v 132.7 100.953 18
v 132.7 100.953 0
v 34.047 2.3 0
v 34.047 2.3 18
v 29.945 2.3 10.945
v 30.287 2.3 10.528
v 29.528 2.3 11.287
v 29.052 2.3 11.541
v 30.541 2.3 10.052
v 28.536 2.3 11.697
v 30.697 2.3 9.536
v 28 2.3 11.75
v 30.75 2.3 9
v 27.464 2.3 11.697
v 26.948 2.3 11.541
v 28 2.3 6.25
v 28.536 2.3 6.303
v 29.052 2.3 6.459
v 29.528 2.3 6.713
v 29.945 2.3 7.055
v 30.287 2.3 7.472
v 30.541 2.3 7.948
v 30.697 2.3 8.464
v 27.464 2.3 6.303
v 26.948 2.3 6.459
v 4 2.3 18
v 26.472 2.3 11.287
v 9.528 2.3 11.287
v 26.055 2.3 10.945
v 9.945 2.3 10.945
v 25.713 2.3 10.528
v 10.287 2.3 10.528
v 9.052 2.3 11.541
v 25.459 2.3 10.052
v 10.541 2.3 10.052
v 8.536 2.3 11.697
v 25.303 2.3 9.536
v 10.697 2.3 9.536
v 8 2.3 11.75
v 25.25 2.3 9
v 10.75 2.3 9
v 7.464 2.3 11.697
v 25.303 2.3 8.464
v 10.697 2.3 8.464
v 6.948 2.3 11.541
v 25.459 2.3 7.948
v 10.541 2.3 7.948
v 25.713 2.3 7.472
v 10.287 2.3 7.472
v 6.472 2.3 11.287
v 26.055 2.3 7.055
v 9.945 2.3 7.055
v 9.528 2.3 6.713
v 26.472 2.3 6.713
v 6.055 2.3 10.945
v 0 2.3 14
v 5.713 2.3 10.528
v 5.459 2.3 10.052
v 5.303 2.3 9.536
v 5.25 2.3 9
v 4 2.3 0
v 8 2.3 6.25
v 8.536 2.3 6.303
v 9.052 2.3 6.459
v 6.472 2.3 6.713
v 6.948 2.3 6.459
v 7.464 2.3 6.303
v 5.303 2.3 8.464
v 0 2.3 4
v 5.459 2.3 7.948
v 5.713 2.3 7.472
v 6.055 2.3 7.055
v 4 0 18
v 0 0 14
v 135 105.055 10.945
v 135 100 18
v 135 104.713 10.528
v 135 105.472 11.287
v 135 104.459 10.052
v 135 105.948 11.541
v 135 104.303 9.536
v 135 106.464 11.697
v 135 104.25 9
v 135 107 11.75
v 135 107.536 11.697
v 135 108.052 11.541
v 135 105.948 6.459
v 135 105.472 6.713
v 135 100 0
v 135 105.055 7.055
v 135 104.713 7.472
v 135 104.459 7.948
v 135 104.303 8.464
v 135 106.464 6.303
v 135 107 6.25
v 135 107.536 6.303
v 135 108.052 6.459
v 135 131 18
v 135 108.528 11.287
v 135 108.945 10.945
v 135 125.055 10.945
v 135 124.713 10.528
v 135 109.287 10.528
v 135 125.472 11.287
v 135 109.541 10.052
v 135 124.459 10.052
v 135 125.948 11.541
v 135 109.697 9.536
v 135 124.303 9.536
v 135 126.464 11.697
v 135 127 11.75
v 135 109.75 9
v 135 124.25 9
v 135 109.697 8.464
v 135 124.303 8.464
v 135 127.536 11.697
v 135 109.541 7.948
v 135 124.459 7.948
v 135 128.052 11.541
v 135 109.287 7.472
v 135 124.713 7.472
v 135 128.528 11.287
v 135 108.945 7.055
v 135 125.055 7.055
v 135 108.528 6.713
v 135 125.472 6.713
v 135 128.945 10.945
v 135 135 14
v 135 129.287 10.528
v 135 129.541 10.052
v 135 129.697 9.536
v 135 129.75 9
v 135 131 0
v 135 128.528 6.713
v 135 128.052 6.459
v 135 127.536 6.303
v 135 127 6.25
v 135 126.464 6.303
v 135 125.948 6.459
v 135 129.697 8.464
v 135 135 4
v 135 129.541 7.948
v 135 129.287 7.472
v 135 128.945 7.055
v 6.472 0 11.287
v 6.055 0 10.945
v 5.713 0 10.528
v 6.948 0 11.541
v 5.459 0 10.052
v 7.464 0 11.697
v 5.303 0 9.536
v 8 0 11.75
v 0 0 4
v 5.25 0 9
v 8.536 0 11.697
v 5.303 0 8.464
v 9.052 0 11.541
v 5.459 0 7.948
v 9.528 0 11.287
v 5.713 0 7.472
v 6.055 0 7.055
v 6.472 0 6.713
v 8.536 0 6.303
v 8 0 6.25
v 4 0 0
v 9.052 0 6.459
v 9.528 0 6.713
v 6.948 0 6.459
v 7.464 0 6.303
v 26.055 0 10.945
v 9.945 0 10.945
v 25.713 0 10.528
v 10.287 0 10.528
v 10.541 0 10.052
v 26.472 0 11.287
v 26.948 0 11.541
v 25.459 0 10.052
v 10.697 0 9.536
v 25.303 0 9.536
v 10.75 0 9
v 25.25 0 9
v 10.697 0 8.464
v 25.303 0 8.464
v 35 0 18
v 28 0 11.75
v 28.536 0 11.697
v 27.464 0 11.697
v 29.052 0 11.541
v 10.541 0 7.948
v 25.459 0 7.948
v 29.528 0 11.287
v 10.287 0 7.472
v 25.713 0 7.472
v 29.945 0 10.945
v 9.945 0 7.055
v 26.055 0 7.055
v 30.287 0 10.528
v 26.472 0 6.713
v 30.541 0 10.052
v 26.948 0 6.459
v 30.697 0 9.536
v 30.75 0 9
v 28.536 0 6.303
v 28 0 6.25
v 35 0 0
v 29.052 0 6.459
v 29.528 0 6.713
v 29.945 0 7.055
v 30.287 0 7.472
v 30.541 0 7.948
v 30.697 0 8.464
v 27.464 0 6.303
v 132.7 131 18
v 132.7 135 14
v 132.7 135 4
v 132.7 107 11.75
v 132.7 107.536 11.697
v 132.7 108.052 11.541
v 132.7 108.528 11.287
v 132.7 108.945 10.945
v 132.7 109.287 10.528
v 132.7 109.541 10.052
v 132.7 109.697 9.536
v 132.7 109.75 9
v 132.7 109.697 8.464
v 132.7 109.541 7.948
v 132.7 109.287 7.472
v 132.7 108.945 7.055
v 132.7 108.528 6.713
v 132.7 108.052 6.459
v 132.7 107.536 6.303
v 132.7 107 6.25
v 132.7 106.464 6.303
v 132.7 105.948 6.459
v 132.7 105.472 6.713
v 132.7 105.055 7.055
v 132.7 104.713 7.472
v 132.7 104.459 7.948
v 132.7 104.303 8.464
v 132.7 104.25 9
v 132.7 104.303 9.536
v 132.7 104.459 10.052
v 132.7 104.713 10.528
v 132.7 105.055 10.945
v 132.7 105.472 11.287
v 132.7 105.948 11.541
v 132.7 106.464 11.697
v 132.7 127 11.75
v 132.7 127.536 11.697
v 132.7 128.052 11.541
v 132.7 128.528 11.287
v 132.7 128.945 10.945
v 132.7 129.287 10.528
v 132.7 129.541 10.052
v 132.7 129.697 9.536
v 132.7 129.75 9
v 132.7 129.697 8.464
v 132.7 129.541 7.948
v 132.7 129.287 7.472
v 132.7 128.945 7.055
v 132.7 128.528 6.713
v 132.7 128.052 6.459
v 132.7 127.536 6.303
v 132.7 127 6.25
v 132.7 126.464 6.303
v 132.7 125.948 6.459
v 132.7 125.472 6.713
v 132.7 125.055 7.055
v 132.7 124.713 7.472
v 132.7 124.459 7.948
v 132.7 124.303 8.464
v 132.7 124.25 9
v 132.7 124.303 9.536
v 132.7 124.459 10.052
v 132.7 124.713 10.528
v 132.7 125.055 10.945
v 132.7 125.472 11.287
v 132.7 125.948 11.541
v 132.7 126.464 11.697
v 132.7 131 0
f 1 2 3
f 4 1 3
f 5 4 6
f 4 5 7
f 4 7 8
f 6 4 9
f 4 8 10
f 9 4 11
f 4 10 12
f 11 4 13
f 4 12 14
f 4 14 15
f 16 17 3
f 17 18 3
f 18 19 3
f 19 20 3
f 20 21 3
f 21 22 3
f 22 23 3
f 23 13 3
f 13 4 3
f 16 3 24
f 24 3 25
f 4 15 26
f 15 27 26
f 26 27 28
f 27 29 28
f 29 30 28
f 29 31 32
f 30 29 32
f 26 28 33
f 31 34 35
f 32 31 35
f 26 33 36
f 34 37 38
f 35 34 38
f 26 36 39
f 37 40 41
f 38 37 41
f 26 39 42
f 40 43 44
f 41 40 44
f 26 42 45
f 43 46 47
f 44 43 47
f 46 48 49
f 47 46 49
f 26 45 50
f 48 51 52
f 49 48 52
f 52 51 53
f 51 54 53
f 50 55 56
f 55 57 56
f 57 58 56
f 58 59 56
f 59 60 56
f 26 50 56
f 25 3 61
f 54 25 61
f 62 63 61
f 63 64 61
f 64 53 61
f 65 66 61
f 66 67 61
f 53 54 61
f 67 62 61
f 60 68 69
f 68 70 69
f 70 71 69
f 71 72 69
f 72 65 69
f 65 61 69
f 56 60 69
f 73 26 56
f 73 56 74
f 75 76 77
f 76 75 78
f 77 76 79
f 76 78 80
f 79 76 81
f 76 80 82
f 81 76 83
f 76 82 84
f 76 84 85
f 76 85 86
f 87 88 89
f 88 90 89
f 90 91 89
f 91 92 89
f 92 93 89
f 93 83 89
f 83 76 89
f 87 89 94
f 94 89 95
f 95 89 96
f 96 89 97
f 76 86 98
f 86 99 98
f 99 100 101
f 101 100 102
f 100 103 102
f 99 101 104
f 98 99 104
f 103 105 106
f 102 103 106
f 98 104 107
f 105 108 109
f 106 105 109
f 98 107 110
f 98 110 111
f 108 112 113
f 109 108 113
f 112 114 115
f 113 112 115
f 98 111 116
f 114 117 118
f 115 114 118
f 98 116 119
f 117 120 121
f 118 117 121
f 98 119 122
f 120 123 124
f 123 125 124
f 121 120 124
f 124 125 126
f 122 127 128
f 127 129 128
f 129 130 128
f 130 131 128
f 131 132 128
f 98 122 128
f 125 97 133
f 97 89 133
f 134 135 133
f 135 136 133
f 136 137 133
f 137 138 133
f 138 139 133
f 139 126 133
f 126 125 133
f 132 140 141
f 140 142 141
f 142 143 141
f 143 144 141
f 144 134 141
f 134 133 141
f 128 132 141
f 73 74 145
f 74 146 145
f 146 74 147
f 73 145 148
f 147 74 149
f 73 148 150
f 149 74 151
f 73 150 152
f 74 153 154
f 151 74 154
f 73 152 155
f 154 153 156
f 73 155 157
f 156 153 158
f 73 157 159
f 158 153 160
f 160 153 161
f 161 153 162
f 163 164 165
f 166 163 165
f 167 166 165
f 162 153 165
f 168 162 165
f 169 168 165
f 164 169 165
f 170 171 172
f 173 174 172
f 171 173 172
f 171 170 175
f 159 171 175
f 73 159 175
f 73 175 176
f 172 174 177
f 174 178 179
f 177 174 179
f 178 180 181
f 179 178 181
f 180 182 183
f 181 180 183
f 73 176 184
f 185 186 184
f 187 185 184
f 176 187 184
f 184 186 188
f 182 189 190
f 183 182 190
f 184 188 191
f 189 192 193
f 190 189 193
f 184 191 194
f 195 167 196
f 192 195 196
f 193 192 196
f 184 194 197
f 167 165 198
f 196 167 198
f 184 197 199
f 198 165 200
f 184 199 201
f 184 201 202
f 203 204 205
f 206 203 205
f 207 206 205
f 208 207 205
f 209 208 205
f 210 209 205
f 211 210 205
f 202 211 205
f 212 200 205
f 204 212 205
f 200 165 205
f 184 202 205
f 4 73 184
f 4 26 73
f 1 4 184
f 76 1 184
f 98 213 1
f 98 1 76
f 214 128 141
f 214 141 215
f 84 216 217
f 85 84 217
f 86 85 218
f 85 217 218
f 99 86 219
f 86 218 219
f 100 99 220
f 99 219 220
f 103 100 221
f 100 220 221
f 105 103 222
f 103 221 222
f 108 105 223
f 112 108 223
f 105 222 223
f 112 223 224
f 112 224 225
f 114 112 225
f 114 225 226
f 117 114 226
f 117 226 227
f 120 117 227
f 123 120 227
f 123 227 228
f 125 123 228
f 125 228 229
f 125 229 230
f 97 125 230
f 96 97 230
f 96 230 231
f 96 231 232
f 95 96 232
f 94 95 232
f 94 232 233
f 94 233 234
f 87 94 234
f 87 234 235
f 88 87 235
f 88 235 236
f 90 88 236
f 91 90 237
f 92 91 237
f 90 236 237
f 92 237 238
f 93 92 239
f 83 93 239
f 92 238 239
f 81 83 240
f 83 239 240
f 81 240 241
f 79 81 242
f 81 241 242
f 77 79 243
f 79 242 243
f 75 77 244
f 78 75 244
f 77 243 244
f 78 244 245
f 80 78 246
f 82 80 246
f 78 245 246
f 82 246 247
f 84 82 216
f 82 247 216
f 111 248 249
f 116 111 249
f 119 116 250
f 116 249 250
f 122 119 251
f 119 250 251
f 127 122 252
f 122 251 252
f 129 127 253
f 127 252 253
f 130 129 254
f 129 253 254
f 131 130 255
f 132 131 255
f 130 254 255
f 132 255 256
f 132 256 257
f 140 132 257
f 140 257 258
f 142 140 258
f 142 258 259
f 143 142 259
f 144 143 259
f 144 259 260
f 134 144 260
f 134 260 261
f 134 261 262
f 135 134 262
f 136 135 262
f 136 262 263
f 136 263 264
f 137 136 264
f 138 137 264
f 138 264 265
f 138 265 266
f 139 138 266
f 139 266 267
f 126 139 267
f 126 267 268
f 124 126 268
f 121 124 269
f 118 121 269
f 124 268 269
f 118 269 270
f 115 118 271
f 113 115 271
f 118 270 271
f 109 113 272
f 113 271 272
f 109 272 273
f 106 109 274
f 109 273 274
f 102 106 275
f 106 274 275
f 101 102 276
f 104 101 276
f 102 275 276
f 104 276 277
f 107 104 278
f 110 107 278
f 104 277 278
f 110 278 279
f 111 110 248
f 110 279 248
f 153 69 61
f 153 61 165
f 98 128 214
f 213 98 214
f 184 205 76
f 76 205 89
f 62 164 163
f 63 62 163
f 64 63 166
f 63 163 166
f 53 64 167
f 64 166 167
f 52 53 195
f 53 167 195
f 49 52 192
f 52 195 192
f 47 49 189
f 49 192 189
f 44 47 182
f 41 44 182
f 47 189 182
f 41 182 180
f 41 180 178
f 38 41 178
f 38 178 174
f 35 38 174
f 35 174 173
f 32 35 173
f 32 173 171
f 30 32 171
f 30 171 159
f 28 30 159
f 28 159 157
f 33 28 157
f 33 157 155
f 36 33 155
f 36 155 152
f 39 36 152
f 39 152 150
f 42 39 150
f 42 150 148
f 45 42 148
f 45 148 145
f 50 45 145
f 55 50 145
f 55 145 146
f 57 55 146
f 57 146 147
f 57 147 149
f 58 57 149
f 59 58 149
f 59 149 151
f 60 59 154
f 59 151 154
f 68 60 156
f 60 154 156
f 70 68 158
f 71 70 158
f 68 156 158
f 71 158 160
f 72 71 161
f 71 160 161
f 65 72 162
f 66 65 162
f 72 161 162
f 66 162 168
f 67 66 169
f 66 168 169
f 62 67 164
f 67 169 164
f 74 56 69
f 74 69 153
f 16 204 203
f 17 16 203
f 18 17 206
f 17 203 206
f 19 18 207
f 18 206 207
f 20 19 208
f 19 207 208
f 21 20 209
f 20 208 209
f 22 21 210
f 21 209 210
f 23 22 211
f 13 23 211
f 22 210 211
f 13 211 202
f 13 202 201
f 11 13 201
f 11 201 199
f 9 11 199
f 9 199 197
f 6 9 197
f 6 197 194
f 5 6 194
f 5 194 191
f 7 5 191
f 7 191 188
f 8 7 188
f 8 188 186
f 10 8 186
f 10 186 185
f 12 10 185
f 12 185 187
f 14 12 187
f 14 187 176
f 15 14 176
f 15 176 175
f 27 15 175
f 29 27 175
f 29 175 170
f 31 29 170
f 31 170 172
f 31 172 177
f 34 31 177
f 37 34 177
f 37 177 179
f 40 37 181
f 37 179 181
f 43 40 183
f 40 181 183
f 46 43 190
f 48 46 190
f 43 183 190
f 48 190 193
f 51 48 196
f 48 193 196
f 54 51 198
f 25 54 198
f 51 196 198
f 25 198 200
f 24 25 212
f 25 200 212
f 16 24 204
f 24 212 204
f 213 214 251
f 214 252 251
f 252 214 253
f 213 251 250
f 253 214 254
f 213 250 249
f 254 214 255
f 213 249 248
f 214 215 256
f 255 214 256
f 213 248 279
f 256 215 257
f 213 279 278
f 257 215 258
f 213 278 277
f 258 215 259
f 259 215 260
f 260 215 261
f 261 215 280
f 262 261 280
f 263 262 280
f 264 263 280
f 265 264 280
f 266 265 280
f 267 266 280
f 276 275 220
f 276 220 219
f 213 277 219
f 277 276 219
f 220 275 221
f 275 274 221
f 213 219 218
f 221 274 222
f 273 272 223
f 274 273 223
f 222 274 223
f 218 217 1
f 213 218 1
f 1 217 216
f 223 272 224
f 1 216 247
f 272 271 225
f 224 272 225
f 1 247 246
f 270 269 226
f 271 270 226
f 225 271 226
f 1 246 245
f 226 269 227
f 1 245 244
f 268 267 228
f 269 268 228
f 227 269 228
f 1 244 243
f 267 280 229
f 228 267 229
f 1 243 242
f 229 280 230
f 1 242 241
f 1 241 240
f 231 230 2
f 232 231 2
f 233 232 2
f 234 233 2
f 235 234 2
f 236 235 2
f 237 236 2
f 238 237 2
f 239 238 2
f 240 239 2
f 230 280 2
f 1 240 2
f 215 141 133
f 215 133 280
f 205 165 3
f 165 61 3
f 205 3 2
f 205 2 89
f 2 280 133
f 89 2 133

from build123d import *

# Parameters (mm, degrees)
BOSS_EXTRUDE1_DEPTH = 18
SKETCH2_R           = 2.75
CUT_EXTRUDE1_DEPTH  = 191.153332866
CHAMFER1_SIZE       = 4
SKETCH3_R           = 2.75
CUT_EXTRUDE2_DEPTH  = 192.765481774
CHAMFER2_SIZE       = 4


with BuildPart() as part:
    # Sketch1 → Boss-Extrude1 (new body)
    with BuildSketch(Plane.XY):
        Polygon((0, 0), (35, 0), (135, 100), (135, 135), (132.7, 135), (132.7, 100.952691193), (34.047308807, 2.3), (0, 2.3), align=None)
    extrude(amount=BOSS_EXTRUDE1_DEPTH)

    # Sketch2 → Cut-Extrude1 (cut, through all)
    with BuildSketch(Plane.ZY.offset(-132.7)):
        with Locations((9, 127)):
            Circle(SKETCH2_R)
        with Locations((9, 107)):
            Circle(SKETCH2_R)
    extrude(amount=-CUT_EXTRUDE1_DEPTH, mode=Mode.SUBTRACT)

    # Chamfer1
    chamfer1_edges = [part.edges().sort_by_distance(p)[0] for p in [
        (133.85, 135, 18),
        (133.85, 135, 0),
    ]]
    chamfer(chamfer1_edges, length=CHAMFER1_SIZE)

    # Sketch3 → Cut-Extrude2 (cut, through all)
    with BuildSketch(Plane.XZ):
        with Locations(Location((8, 9, 0), (0, 0, 270))):
            Circle(SKETCH3_R)
        with Locations(Location((28, 9, 0), (0, 0, 270))):
            Circle(SKETCH3_R)
    extrude(amount=-CUT_EXTRUDE2_DEPTH, mode=Mode.SUBTRACT)

    # Chamfer2
    chamfer2_edges = [part.edges().sort_by_distance(p)[0] for p in [
        (0, 1.15, 0),
        (0, 1.15, 18),
    ]]
    chamfer(chamfer2_edges, length=CHAMFER2_SIZE)


solid = part.part
